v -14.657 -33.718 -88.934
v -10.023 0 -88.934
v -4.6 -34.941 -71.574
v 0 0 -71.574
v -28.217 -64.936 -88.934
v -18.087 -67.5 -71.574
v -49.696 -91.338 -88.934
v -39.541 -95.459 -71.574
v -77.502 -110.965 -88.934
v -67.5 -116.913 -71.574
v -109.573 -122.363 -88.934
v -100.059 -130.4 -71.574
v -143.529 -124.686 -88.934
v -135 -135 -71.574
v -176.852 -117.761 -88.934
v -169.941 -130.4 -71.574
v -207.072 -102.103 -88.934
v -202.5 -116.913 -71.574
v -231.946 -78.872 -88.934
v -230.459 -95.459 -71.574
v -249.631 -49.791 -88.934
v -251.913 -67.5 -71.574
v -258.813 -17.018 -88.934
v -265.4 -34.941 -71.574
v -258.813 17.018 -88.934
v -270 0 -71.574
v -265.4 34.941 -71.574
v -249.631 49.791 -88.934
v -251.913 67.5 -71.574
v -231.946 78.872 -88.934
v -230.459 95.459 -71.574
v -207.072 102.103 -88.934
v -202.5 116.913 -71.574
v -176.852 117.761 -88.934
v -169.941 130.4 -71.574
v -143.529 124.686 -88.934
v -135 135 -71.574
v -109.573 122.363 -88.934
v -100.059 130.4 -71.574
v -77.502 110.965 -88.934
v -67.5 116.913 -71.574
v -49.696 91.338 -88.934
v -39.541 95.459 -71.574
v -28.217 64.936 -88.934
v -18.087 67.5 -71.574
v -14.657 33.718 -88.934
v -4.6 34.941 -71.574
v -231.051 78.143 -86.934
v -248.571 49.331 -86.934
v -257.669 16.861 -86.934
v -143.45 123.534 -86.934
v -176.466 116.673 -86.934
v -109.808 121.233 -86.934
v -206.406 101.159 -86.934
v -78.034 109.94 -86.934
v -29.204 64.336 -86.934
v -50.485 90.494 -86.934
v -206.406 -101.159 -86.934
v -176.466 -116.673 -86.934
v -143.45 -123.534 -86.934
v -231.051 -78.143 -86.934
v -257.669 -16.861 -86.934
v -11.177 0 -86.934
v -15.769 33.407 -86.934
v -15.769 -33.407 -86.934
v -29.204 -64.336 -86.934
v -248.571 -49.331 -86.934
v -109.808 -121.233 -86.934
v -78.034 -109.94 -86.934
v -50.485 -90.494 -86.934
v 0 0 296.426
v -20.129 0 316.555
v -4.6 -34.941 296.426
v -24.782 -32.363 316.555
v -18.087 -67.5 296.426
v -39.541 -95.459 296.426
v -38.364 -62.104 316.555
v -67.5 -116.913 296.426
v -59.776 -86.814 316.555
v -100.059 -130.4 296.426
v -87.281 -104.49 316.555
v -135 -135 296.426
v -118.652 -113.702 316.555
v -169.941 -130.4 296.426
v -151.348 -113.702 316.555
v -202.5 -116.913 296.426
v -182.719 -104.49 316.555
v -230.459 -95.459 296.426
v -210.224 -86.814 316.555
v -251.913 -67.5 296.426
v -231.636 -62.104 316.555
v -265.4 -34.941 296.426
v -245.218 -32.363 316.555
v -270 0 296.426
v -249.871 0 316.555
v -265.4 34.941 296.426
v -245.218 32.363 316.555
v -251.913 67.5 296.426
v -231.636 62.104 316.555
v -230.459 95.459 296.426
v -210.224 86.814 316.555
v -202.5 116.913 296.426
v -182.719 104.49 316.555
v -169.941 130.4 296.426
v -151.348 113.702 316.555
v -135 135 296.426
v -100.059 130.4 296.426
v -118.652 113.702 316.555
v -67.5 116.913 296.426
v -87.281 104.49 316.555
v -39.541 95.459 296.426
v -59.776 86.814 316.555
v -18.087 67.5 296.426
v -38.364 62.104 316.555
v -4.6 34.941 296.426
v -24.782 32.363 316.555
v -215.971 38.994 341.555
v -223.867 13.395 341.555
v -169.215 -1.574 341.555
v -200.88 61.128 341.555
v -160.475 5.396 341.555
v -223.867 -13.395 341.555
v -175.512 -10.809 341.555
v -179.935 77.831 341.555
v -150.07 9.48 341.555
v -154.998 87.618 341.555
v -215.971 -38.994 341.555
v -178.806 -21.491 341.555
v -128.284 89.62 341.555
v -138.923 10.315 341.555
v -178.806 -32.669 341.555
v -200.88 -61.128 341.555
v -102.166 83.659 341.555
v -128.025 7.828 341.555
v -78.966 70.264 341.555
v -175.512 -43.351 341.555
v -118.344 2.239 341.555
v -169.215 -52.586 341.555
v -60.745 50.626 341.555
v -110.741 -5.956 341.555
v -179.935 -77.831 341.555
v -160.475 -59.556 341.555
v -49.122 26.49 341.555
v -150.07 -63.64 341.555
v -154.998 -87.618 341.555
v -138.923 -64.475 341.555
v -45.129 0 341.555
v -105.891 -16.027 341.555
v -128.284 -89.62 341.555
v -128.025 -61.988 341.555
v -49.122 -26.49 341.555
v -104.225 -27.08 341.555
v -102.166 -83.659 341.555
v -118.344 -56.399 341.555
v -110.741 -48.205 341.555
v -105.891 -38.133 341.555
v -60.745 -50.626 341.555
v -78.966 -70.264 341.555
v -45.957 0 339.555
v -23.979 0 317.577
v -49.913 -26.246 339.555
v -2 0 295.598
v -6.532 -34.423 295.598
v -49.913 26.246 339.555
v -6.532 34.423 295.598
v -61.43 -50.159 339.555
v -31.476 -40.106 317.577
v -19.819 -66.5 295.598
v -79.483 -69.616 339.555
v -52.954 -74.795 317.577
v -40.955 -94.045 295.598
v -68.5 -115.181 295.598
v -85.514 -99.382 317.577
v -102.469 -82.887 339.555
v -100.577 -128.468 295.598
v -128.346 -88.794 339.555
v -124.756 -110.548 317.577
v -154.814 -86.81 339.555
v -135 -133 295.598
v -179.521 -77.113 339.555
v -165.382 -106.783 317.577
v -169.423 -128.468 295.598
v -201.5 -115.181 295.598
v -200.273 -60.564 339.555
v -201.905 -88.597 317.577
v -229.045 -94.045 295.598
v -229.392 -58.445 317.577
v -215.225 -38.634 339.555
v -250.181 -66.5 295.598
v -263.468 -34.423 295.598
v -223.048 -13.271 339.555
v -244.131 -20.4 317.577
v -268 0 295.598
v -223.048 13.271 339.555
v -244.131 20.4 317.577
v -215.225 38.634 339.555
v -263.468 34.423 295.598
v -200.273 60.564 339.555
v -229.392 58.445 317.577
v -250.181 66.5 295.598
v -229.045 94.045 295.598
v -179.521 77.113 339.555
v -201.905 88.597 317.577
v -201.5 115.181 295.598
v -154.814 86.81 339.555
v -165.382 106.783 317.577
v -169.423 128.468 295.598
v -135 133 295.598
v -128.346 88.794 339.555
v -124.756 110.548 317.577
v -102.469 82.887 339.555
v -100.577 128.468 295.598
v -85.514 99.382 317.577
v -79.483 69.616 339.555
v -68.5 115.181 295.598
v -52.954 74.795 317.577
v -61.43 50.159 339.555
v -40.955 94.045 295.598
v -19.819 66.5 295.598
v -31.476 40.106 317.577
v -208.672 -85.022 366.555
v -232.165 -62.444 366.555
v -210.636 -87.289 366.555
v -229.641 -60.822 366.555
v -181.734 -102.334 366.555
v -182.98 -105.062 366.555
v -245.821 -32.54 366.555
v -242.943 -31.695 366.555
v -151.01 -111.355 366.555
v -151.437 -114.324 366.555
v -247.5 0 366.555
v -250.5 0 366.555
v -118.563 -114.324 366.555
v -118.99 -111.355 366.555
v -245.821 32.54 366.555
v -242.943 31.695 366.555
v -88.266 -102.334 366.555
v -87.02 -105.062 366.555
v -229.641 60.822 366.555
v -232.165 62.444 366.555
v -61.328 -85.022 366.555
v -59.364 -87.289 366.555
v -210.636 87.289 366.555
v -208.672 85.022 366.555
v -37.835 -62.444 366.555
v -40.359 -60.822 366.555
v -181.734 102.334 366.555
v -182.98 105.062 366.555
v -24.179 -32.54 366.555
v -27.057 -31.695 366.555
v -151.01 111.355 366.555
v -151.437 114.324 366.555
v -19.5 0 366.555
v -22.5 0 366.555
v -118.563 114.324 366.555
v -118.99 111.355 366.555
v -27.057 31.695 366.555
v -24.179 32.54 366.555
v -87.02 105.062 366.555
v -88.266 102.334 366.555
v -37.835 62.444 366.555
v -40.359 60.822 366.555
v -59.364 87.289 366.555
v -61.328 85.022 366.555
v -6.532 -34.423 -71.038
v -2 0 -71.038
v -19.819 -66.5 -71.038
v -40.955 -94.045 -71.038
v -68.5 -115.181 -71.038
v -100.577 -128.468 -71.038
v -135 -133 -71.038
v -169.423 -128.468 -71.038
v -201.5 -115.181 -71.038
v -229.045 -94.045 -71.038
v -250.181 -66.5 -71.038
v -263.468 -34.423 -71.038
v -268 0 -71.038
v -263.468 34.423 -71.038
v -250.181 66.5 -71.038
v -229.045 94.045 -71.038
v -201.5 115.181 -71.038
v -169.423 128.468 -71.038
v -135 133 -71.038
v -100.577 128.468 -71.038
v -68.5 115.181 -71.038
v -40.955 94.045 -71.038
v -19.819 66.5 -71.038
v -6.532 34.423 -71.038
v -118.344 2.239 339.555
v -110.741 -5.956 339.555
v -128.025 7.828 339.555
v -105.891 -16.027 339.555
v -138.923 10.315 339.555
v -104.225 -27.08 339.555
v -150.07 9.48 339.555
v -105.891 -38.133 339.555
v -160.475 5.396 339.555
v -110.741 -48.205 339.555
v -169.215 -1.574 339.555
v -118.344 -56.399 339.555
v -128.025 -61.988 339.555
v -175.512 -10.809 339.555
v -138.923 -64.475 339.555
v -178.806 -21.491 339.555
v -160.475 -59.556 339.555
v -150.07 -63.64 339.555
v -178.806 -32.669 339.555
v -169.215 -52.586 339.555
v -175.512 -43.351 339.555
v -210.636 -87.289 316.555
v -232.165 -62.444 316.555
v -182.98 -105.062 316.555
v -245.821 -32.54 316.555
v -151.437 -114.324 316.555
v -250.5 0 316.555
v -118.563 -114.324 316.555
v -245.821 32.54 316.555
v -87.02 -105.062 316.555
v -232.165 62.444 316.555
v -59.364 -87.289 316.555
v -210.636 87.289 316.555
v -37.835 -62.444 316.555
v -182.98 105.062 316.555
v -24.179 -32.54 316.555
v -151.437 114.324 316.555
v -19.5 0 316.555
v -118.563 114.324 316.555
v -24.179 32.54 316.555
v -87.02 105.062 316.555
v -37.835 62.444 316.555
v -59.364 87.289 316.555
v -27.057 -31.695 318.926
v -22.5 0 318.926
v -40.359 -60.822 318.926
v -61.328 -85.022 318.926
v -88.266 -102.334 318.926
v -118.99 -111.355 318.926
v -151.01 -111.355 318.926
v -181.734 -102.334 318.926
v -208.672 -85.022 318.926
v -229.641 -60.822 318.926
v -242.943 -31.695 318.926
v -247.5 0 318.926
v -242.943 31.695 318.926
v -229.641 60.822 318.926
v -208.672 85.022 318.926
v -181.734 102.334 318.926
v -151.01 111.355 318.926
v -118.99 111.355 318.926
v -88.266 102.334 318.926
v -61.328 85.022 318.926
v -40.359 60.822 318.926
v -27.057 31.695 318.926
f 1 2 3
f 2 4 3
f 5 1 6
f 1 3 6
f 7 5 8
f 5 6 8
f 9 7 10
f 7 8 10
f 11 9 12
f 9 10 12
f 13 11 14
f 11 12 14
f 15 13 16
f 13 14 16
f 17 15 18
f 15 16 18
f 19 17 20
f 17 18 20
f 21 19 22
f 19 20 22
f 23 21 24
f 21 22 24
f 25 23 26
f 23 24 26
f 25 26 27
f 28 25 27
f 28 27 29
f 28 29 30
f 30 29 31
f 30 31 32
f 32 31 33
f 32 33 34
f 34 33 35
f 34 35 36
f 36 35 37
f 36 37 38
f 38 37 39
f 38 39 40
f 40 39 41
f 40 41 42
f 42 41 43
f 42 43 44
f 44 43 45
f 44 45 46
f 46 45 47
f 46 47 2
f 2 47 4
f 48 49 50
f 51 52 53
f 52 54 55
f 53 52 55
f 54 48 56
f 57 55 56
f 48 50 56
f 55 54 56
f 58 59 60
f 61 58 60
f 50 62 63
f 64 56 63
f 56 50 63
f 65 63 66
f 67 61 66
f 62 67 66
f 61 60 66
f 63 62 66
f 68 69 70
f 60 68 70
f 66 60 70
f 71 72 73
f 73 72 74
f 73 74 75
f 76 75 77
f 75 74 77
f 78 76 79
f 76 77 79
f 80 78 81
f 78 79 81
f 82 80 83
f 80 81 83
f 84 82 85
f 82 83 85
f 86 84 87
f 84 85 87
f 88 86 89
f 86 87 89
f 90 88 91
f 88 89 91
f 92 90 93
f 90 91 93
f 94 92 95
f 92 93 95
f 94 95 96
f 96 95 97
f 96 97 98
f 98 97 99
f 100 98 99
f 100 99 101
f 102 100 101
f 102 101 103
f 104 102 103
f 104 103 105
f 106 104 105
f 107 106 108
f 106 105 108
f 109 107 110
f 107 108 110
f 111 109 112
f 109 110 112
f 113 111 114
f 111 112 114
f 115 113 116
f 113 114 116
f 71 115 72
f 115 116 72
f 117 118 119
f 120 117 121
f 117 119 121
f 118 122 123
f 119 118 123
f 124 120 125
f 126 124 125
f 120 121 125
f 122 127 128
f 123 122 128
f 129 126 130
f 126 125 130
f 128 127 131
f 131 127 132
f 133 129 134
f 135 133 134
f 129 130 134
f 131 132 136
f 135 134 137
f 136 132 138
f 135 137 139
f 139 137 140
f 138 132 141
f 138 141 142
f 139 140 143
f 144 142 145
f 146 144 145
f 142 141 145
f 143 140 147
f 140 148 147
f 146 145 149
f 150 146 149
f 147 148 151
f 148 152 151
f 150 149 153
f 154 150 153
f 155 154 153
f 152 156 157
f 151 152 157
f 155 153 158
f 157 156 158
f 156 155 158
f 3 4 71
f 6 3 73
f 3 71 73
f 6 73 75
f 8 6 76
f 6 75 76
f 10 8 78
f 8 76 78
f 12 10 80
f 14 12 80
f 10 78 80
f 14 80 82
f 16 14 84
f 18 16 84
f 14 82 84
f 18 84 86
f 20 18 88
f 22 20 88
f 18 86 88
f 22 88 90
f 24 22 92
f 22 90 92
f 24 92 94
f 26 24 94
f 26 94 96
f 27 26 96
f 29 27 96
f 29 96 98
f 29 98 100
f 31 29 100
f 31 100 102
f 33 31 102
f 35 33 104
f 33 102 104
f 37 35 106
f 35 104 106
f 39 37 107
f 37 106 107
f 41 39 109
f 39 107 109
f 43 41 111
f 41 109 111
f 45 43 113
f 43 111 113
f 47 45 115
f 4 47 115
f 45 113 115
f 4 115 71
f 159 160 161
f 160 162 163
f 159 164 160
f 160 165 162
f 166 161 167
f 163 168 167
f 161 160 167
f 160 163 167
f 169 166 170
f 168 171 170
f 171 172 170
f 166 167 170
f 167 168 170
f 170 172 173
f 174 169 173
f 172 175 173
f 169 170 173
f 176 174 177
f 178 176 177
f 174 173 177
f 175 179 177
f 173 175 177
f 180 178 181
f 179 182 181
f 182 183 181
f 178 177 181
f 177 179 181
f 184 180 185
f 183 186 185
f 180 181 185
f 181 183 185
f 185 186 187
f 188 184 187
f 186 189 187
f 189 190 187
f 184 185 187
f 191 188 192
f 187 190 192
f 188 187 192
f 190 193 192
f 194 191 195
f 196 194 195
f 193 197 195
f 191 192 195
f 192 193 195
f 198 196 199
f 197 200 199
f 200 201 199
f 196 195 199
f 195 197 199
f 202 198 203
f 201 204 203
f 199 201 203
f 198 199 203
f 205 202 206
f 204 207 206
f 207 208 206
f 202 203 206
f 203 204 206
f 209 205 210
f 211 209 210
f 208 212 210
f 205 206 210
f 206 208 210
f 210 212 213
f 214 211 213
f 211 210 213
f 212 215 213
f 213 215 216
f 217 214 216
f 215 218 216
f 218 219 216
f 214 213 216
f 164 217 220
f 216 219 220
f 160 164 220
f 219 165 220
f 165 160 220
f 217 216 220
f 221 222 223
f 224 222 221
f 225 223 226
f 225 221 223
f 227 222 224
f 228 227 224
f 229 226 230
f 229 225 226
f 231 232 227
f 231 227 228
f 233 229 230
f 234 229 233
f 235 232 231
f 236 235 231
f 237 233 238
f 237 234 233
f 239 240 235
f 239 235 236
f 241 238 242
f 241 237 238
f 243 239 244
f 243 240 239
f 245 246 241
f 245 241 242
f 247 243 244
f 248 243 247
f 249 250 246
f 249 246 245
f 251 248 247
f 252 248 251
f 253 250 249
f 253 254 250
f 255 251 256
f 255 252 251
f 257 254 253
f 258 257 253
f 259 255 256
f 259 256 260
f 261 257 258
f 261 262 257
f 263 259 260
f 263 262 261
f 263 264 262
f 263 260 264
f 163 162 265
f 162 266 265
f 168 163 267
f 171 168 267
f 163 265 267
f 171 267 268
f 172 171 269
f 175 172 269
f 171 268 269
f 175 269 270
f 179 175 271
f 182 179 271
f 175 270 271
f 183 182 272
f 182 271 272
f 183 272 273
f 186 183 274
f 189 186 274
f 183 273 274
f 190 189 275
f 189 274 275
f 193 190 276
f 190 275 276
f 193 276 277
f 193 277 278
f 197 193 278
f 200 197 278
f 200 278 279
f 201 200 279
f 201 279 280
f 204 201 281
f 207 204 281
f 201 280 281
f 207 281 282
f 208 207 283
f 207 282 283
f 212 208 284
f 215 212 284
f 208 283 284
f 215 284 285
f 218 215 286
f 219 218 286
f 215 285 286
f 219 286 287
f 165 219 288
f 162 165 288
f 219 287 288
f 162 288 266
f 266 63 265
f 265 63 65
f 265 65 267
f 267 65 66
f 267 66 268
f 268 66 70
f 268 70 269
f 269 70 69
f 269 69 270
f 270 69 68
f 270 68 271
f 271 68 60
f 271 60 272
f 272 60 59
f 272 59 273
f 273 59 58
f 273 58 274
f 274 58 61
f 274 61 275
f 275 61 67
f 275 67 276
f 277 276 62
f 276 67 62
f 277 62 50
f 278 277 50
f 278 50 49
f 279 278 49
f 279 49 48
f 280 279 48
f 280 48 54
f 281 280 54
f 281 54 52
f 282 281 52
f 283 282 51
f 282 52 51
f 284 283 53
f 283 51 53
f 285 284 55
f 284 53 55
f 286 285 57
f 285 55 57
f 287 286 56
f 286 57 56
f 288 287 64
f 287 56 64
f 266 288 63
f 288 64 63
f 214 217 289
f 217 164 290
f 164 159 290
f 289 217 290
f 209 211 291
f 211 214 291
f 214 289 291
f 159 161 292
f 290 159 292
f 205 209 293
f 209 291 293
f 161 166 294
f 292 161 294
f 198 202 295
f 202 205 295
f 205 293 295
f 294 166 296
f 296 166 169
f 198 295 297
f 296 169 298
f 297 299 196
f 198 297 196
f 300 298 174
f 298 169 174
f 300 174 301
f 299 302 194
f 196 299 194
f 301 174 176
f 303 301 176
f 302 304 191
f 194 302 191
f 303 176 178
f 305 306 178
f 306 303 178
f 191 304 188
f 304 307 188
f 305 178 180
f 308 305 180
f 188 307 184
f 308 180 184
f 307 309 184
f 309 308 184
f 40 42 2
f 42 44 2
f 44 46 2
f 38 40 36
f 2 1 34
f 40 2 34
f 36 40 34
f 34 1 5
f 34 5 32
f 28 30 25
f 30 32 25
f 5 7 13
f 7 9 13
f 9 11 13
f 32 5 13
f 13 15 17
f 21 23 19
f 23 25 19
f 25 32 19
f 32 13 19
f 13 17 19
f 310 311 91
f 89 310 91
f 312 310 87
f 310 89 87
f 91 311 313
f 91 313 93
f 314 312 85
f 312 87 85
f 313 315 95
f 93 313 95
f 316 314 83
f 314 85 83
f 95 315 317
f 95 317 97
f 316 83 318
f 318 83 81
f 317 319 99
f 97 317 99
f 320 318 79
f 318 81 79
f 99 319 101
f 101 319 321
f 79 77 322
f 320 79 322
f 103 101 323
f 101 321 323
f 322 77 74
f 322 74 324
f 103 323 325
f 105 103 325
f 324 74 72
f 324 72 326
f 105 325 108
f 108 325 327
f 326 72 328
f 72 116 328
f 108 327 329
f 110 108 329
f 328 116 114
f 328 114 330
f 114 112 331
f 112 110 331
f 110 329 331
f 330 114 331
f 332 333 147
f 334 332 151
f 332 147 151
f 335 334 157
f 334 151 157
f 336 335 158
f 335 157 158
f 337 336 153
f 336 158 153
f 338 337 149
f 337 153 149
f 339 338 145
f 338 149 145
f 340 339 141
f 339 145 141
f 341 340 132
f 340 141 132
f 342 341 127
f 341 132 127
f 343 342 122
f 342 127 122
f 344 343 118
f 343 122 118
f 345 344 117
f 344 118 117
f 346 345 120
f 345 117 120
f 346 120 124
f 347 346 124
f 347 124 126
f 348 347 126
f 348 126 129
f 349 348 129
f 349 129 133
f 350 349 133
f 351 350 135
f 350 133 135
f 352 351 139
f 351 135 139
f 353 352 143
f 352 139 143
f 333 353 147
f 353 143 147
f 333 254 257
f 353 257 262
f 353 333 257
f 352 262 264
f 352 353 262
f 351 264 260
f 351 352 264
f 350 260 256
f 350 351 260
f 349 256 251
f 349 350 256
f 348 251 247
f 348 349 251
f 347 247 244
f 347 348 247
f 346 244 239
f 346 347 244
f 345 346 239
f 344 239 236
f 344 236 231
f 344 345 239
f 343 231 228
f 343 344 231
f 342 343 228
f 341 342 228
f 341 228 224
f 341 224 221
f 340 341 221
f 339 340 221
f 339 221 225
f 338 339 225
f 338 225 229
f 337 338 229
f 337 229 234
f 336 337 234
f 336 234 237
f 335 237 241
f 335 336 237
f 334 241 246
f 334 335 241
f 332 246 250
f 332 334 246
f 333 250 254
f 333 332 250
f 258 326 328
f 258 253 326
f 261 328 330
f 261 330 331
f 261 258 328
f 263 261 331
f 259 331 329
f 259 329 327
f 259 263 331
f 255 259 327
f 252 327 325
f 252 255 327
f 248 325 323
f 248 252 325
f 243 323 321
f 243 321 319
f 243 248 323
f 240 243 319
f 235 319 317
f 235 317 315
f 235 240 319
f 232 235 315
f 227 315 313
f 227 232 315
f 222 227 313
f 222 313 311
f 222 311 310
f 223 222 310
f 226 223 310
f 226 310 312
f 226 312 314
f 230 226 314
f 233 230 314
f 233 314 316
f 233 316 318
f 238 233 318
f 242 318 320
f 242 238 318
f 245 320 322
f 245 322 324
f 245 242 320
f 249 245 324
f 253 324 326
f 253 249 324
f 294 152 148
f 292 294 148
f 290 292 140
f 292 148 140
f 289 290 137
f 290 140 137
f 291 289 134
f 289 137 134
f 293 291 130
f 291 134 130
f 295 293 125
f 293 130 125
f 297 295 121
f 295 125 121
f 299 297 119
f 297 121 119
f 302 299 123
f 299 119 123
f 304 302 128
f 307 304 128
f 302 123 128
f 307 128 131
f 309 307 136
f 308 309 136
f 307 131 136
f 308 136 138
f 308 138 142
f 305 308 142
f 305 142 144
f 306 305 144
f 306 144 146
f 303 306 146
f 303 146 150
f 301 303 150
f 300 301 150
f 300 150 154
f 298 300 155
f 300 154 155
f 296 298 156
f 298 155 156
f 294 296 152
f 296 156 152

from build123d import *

# Parameters (mm, degrees)
F4_R     = 115.5
F4_R_2   = 112.5
F2_DEPTH = 25
F3_R     = 37.5
F5_DEPTH = 2


with BuildPart() as f1:
    # F0 (on Front) → F1 (revolve)
    with BuildSketch(Plane.XZ):
        Polygon((0, -71.573662), (0, 296.426338), (-45.129046, 341.555384), (-135, 341.555384), (-135, 339.555384), (-45.957473, 339.555384), (-2, 295.597911), (-2, -71.037763), (-11.177422, -86.933525), (-135, -86.933525), (-135, -88.933525), (-10.022722, -88.933525), align=None)
    revolve(axis=Axis((-135, 0, 126.31093), (0, 0, -1)))

    # F4 (on face) → F2 (join, symmetric)
    with BuildSketch(Plane.XY.offset(341.555384)):
        with Locations((-135, 0)):
            Circle(F4_R)
        with Locations((-135, 0)):
            Circle(F4_R_2, mode=Mode.SUBTRACT)
    extrude(amount=F2_DEPTH, both=True)

    # F3 (on face) → F5 (cut, through all)
    with BuildSketch(Plane.XY.offset(341.555384)):
        with Locations((-141.725168, -27.080007)):
            Circle(F3_R)
    extrude(amount=-F5_DEPTH, mode=Mode.SUBTRACT)


solid = f1.part
